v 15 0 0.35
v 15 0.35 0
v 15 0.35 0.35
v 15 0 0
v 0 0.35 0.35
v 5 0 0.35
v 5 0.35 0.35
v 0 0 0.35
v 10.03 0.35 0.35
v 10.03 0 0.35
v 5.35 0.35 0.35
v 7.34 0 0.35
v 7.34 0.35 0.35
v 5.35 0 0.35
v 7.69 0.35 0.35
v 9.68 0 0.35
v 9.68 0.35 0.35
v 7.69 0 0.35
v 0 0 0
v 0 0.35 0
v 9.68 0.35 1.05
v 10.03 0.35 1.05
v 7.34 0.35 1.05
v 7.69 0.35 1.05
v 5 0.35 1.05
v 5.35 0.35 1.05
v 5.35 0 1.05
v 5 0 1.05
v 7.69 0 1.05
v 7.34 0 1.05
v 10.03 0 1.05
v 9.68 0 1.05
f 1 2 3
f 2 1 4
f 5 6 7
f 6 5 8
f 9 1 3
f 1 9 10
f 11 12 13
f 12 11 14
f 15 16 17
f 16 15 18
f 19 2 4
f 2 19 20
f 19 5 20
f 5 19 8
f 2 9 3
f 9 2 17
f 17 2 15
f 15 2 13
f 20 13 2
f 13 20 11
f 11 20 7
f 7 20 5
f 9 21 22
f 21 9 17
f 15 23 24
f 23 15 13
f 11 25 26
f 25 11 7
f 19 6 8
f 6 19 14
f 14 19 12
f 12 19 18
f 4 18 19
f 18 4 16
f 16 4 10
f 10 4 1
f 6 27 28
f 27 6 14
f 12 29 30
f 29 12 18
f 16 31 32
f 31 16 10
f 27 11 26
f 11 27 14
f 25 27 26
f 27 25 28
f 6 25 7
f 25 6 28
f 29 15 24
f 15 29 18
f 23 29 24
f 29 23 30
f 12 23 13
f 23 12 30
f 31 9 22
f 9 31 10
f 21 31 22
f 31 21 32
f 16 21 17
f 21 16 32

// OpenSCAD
rod_width = 0.35;
rod_length = 15;

cube([rod_length, rod_width, rod_width]);

// pegs
translate([5,0,0])
        cube([rod_width, rod_width, rod_width*3]);
translate([5+2.34,0,0])
        cube([rod_width, rod_width, rod_width*3]);
translate([5+2*2.34,0,0])
        cube([rod_width, rod_width, rod_width*3]);
